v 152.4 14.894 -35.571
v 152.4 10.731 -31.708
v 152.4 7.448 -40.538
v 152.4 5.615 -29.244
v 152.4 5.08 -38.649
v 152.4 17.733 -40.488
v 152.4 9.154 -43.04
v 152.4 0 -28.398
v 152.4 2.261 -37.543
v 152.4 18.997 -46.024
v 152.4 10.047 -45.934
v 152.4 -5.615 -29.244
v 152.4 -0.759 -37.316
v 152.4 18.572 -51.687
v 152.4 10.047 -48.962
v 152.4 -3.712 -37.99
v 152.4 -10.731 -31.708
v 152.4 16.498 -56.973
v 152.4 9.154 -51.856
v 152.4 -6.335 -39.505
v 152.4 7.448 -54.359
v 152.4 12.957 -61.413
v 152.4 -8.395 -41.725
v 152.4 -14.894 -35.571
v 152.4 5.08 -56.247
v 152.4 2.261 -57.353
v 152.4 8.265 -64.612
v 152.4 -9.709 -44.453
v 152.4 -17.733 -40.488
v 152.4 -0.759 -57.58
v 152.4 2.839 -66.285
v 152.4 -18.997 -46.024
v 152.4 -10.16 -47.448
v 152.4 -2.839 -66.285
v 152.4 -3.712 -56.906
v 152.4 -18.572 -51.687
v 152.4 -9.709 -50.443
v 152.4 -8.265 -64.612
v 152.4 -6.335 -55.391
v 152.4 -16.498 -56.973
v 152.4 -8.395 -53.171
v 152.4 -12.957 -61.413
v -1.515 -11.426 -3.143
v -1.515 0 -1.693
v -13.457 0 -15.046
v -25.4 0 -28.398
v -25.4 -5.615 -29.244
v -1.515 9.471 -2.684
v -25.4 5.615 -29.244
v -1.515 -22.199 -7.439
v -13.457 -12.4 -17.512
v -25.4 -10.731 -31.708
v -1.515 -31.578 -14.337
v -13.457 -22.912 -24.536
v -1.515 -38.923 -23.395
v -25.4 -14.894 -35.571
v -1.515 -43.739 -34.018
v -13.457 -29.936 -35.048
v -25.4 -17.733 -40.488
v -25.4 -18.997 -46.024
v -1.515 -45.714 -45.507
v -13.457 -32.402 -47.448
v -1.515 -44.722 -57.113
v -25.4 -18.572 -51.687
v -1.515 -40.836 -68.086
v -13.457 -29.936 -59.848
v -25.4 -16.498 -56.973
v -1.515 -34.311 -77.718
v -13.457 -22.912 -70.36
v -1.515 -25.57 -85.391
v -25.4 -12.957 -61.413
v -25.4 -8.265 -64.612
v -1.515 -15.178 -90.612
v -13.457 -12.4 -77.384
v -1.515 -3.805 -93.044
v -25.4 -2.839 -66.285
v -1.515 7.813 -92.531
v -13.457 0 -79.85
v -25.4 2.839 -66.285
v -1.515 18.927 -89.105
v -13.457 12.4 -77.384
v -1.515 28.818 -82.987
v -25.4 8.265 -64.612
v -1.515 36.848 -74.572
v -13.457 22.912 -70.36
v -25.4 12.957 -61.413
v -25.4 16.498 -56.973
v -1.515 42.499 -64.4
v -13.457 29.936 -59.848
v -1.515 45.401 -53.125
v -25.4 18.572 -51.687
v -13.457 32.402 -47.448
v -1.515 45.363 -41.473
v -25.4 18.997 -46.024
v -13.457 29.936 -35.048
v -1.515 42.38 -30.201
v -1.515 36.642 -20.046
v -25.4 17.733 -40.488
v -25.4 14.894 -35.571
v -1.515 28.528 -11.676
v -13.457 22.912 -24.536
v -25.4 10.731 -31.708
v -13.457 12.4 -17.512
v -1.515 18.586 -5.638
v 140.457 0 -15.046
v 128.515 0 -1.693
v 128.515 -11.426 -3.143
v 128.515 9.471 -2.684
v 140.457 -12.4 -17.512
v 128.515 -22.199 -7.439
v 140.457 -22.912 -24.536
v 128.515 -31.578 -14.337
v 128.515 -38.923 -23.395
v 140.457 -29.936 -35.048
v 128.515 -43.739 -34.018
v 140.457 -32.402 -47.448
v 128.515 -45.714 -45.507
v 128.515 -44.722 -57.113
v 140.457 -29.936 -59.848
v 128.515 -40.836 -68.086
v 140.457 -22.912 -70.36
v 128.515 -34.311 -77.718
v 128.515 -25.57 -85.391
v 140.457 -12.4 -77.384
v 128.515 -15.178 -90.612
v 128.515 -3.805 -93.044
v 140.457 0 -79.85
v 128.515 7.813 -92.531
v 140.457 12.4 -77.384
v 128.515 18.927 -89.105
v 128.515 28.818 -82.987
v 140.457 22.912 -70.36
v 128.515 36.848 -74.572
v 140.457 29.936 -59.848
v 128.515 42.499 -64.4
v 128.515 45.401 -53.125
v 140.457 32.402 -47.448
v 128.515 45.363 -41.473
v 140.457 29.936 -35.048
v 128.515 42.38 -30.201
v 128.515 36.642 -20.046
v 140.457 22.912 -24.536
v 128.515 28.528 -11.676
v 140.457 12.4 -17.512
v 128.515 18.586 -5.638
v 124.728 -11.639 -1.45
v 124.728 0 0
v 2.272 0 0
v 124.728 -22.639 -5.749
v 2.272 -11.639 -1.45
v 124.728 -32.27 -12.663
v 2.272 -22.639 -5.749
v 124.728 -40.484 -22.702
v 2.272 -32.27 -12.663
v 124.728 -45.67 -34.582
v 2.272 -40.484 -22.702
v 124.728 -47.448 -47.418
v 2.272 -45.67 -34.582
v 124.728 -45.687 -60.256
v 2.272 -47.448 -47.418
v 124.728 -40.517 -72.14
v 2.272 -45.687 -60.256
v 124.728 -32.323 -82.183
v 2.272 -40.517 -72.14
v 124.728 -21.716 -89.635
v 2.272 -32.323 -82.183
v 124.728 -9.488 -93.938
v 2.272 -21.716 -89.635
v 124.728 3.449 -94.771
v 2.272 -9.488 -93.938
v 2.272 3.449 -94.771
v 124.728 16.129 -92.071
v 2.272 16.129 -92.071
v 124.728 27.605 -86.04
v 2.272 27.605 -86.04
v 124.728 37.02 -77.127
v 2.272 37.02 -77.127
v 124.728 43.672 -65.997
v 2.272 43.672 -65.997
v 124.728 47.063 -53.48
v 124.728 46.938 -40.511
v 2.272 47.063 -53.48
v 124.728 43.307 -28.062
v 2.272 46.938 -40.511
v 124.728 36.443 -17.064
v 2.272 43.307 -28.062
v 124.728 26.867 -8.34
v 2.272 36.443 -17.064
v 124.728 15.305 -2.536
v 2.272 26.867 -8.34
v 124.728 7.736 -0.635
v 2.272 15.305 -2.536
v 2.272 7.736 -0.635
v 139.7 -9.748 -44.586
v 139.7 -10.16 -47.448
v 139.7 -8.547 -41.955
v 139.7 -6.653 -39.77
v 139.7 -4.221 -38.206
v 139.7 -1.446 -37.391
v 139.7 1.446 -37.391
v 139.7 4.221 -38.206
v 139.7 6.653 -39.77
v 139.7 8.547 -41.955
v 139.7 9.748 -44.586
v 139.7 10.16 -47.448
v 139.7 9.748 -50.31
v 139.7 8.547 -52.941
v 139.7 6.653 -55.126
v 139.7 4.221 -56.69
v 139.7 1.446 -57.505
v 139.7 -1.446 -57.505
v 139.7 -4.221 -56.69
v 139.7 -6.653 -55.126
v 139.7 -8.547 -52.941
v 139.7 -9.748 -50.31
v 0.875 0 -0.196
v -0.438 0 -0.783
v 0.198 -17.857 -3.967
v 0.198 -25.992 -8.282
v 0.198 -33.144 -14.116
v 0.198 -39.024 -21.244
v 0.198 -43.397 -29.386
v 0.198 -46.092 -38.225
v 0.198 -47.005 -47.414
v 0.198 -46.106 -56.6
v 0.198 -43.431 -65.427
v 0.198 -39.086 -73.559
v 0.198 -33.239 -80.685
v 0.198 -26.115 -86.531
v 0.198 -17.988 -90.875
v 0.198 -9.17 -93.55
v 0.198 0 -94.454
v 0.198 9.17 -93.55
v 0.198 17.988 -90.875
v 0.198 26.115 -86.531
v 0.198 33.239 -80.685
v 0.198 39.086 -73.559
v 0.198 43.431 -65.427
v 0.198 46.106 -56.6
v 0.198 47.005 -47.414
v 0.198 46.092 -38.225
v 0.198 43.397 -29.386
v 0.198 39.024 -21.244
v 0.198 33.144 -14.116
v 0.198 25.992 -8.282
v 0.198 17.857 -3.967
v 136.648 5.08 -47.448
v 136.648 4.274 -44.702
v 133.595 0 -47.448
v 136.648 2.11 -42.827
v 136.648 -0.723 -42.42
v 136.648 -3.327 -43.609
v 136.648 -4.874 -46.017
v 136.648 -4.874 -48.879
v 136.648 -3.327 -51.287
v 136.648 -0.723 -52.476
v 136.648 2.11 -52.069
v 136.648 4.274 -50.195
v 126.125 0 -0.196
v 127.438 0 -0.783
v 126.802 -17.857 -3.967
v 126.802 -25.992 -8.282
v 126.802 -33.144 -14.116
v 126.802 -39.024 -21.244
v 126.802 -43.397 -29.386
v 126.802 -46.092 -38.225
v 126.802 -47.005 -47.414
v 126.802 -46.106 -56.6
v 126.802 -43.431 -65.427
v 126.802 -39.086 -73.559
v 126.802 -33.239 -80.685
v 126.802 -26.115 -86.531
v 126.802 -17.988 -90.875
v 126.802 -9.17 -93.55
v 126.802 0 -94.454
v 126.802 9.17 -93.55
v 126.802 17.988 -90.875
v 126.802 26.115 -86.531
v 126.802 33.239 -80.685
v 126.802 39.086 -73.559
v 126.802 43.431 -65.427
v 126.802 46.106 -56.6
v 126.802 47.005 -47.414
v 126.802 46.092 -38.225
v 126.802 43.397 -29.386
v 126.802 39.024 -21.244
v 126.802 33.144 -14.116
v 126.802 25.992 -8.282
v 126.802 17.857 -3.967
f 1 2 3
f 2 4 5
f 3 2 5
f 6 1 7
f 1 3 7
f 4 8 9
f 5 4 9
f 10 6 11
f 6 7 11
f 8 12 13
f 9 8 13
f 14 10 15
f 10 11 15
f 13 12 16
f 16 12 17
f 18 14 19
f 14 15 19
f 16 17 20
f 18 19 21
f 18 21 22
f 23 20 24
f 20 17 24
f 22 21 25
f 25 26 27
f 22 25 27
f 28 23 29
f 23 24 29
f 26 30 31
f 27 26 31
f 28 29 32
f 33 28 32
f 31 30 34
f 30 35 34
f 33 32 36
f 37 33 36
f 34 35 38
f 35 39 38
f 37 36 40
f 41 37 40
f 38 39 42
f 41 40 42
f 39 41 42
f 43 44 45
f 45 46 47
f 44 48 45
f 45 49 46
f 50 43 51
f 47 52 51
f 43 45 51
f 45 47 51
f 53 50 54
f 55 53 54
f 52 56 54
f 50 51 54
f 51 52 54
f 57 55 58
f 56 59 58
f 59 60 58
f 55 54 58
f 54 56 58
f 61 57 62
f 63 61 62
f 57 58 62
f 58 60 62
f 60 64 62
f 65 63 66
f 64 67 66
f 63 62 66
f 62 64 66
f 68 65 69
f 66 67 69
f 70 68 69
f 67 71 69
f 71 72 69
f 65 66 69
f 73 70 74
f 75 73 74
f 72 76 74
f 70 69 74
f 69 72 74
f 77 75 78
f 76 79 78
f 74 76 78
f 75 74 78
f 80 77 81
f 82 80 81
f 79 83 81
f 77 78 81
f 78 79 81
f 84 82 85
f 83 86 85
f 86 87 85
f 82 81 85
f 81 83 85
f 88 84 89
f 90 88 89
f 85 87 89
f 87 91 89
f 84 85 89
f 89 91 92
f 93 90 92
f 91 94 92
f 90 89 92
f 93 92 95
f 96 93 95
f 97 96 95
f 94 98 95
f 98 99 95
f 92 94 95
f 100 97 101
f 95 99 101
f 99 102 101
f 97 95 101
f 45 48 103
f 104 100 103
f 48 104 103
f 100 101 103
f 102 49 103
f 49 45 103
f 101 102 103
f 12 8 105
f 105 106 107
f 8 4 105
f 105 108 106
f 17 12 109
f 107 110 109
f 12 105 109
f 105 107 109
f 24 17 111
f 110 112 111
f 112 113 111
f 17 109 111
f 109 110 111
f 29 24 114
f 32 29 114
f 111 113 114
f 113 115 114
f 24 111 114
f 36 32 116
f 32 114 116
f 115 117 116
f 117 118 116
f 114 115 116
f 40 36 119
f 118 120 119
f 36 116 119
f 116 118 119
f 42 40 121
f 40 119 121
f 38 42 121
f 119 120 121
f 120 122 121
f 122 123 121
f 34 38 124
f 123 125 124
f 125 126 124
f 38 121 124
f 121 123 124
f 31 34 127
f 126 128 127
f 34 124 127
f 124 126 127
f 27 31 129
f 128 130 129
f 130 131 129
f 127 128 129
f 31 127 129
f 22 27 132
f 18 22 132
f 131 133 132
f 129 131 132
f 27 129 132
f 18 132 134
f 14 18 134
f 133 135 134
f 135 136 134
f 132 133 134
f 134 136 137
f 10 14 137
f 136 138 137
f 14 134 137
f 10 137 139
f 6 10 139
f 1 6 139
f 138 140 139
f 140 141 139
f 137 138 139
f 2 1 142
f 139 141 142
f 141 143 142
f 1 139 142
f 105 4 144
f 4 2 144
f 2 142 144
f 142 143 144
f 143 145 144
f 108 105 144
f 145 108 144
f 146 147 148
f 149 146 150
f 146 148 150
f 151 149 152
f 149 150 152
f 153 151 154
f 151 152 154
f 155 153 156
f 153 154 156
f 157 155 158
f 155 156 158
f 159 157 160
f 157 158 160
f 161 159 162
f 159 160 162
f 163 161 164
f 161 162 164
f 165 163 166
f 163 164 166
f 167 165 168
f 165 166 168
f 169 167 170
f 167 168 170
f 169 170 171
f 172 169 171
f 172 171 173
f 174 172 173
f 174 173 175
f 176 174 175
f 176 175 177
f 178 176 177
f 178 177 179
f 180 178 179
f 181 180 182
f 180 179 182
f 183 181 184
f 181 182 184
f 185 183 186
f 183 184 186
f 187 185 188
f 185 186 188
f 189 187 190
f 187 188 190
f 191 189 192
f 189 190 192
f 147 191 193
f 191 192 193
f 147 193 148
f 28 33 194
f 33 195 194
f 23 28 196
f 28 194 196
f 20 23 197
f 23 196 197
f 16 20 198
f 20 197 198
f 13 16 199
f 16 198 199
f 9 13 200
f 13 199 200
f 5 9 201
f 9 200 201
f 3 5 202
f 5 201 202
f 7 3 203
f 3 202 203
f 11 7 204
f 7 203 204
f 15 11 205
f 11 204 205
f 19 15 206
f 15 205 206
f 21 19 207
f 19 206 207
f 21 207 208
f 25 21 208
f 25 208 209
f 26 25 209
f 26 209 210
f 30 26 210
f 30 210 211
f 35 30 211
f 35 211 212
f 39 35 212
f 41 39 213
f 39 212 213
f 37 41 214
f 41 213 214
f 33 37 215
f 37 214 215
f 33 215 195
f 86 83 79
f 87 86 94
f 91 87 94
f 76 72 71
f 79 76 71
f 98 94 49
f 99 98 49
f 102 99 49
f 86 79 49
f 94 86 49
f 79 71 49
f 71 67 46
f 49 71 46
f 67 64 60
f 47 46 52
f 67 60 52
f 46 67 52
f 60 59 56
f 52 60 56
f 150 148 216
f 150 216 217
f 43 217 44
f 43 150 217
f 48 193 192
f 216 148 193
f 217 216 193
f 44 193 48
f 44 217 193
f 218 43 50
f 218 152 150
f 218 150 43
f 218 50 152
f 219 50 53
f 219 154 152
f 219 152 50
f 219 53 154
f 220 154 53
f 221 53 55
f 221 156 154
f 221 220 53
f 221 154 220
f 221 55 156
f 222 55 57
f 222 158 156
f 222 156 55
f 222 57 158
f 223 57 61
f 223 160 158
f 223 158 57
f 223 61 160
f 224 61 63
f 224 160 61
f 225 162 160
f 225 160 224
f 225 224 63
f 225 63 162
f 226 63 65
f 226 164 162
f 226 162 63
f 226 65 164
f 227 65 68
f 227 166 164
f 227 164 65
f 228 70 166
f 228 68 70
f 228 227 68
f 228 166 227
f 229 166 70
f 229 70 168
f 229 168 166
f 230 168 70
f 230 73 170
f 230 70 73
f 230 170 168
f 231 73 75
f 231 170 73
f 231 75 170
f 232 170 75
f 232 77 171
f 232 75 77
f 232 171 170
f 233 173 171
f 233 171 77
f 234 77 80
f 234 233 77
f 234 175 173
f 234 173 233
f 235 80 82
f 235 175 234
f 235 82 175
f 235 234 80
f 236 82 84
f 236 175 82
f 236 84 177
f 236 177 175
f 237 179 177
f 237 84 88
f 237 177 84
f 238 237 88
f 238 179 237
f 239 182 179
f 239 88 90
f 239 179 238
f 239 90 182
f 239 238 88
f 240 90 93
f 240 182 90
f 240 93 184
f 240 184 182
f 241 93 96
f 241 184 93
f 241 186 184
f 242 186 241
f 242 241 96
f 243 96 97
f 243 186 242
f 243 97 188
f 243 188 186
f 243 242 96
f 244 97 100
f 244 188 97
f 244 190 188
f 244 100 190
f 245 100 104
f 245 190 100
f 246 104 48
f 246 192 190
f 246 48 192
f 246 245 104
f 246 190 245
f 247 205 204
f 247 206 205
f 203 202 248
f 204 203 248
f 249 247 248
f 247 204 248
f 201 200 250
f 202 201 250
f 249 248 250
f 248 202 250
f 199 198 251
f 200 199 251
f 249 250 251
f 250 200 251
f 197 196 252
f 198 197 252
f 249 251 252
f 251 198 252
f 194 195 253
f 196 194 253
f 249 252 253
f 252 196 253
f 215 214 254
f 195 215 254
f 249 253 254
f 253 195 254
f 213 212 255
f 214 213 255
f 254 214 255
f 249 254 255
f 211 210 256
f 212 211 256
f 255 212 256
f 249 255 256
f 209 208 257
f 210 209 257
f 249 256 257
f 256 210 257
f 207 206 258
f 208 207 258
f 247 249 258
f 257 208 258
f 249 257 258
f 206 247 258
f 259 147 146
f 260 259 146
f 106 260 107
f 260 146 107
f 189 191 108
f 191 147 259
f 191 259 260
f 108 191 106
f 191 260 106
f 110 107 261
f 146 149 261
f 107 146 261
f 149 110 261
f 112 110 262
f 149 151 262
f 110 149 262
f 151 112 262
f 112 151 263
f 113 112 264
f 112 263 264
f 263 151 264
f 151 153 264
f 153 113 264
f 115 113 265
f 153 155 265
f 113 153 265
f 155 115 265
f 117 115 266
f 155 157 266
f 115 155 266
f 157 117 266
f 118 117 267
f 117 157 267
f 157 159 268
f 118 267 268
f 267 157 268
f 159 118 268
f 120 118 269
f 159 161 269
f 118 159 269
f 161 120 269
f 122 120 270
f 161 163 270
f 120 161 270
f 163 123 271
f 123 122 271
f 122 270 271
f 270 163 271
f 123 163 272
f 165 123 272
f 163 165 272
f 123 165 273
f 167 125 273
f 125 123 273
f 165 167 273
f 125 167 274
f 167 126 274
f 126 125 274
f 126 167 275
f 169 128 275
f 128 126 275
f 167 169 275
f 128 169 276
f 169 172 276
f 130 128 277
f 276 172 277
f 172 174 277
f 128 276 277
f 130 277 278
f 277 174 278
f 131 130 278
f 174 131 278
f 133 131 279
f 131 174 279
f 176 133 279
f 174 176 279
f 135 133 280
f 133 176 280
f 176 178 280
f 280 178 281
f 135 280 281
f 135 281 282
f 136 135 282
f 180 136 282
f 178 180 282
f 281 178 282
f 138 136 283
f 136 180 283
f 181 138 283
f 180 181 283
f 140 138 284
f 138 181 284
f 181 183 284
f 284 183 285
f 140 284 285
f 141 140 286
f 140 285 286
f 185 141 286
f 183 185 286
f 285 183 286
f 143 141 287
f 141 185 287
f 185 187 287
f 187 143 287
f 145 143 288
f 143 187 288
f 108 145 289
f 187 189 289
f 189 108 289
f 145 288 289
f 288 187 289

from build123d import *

# Parameters (mm, degrees)
F4_D     = 20.32
F4_DEPTH = 12.7
F4_TIP   = 6.1047438893
F3_R     = 5.08
F5_R     = 5.08


with BuildPart() as f1:
    # F0 (on Front) → F1 (revolve)
    with BuildSketch(Plane.XZ):
        Polygon((127, 0), (0, 0), (-25.4, -28.3980633142), (-25.4, -47.4480633142), (152.4, -47.4480633142), (152.4, -28.3980633142), align=None)
    revolve(axis=Axis((63.5, 0, -47.4480633142), (1, 0, 0)))

    # F4
    with Locations(Plane.YZ.offset(152.4)):
        with Locations((0, -47.4480633142)):
            Hole(F4_D / 2, depth=F4_DEPTH)
            with Locations((0, 0, -(F4_DEPTH + F4_TIP / 2))):  # 118° drill point
                Cone(0, F4_D / 2, F4_TIP, mode=Mode.SUBTRACT)

    # F3
    f3_edges = [f1.edges().sort_by_distance(p)[0] for p in [
        (127, 0, -94.896127),
    ]]
    fillet(f3_edges, radius=F3_R)

    # F5
    f5_edges = [f1.edges().sort_by_distance(p)[0] for p in [
        (0, 0, -94.896127),
    ]]
    fillet(f5_edges, radius=F5_R)


solid = f1.part
